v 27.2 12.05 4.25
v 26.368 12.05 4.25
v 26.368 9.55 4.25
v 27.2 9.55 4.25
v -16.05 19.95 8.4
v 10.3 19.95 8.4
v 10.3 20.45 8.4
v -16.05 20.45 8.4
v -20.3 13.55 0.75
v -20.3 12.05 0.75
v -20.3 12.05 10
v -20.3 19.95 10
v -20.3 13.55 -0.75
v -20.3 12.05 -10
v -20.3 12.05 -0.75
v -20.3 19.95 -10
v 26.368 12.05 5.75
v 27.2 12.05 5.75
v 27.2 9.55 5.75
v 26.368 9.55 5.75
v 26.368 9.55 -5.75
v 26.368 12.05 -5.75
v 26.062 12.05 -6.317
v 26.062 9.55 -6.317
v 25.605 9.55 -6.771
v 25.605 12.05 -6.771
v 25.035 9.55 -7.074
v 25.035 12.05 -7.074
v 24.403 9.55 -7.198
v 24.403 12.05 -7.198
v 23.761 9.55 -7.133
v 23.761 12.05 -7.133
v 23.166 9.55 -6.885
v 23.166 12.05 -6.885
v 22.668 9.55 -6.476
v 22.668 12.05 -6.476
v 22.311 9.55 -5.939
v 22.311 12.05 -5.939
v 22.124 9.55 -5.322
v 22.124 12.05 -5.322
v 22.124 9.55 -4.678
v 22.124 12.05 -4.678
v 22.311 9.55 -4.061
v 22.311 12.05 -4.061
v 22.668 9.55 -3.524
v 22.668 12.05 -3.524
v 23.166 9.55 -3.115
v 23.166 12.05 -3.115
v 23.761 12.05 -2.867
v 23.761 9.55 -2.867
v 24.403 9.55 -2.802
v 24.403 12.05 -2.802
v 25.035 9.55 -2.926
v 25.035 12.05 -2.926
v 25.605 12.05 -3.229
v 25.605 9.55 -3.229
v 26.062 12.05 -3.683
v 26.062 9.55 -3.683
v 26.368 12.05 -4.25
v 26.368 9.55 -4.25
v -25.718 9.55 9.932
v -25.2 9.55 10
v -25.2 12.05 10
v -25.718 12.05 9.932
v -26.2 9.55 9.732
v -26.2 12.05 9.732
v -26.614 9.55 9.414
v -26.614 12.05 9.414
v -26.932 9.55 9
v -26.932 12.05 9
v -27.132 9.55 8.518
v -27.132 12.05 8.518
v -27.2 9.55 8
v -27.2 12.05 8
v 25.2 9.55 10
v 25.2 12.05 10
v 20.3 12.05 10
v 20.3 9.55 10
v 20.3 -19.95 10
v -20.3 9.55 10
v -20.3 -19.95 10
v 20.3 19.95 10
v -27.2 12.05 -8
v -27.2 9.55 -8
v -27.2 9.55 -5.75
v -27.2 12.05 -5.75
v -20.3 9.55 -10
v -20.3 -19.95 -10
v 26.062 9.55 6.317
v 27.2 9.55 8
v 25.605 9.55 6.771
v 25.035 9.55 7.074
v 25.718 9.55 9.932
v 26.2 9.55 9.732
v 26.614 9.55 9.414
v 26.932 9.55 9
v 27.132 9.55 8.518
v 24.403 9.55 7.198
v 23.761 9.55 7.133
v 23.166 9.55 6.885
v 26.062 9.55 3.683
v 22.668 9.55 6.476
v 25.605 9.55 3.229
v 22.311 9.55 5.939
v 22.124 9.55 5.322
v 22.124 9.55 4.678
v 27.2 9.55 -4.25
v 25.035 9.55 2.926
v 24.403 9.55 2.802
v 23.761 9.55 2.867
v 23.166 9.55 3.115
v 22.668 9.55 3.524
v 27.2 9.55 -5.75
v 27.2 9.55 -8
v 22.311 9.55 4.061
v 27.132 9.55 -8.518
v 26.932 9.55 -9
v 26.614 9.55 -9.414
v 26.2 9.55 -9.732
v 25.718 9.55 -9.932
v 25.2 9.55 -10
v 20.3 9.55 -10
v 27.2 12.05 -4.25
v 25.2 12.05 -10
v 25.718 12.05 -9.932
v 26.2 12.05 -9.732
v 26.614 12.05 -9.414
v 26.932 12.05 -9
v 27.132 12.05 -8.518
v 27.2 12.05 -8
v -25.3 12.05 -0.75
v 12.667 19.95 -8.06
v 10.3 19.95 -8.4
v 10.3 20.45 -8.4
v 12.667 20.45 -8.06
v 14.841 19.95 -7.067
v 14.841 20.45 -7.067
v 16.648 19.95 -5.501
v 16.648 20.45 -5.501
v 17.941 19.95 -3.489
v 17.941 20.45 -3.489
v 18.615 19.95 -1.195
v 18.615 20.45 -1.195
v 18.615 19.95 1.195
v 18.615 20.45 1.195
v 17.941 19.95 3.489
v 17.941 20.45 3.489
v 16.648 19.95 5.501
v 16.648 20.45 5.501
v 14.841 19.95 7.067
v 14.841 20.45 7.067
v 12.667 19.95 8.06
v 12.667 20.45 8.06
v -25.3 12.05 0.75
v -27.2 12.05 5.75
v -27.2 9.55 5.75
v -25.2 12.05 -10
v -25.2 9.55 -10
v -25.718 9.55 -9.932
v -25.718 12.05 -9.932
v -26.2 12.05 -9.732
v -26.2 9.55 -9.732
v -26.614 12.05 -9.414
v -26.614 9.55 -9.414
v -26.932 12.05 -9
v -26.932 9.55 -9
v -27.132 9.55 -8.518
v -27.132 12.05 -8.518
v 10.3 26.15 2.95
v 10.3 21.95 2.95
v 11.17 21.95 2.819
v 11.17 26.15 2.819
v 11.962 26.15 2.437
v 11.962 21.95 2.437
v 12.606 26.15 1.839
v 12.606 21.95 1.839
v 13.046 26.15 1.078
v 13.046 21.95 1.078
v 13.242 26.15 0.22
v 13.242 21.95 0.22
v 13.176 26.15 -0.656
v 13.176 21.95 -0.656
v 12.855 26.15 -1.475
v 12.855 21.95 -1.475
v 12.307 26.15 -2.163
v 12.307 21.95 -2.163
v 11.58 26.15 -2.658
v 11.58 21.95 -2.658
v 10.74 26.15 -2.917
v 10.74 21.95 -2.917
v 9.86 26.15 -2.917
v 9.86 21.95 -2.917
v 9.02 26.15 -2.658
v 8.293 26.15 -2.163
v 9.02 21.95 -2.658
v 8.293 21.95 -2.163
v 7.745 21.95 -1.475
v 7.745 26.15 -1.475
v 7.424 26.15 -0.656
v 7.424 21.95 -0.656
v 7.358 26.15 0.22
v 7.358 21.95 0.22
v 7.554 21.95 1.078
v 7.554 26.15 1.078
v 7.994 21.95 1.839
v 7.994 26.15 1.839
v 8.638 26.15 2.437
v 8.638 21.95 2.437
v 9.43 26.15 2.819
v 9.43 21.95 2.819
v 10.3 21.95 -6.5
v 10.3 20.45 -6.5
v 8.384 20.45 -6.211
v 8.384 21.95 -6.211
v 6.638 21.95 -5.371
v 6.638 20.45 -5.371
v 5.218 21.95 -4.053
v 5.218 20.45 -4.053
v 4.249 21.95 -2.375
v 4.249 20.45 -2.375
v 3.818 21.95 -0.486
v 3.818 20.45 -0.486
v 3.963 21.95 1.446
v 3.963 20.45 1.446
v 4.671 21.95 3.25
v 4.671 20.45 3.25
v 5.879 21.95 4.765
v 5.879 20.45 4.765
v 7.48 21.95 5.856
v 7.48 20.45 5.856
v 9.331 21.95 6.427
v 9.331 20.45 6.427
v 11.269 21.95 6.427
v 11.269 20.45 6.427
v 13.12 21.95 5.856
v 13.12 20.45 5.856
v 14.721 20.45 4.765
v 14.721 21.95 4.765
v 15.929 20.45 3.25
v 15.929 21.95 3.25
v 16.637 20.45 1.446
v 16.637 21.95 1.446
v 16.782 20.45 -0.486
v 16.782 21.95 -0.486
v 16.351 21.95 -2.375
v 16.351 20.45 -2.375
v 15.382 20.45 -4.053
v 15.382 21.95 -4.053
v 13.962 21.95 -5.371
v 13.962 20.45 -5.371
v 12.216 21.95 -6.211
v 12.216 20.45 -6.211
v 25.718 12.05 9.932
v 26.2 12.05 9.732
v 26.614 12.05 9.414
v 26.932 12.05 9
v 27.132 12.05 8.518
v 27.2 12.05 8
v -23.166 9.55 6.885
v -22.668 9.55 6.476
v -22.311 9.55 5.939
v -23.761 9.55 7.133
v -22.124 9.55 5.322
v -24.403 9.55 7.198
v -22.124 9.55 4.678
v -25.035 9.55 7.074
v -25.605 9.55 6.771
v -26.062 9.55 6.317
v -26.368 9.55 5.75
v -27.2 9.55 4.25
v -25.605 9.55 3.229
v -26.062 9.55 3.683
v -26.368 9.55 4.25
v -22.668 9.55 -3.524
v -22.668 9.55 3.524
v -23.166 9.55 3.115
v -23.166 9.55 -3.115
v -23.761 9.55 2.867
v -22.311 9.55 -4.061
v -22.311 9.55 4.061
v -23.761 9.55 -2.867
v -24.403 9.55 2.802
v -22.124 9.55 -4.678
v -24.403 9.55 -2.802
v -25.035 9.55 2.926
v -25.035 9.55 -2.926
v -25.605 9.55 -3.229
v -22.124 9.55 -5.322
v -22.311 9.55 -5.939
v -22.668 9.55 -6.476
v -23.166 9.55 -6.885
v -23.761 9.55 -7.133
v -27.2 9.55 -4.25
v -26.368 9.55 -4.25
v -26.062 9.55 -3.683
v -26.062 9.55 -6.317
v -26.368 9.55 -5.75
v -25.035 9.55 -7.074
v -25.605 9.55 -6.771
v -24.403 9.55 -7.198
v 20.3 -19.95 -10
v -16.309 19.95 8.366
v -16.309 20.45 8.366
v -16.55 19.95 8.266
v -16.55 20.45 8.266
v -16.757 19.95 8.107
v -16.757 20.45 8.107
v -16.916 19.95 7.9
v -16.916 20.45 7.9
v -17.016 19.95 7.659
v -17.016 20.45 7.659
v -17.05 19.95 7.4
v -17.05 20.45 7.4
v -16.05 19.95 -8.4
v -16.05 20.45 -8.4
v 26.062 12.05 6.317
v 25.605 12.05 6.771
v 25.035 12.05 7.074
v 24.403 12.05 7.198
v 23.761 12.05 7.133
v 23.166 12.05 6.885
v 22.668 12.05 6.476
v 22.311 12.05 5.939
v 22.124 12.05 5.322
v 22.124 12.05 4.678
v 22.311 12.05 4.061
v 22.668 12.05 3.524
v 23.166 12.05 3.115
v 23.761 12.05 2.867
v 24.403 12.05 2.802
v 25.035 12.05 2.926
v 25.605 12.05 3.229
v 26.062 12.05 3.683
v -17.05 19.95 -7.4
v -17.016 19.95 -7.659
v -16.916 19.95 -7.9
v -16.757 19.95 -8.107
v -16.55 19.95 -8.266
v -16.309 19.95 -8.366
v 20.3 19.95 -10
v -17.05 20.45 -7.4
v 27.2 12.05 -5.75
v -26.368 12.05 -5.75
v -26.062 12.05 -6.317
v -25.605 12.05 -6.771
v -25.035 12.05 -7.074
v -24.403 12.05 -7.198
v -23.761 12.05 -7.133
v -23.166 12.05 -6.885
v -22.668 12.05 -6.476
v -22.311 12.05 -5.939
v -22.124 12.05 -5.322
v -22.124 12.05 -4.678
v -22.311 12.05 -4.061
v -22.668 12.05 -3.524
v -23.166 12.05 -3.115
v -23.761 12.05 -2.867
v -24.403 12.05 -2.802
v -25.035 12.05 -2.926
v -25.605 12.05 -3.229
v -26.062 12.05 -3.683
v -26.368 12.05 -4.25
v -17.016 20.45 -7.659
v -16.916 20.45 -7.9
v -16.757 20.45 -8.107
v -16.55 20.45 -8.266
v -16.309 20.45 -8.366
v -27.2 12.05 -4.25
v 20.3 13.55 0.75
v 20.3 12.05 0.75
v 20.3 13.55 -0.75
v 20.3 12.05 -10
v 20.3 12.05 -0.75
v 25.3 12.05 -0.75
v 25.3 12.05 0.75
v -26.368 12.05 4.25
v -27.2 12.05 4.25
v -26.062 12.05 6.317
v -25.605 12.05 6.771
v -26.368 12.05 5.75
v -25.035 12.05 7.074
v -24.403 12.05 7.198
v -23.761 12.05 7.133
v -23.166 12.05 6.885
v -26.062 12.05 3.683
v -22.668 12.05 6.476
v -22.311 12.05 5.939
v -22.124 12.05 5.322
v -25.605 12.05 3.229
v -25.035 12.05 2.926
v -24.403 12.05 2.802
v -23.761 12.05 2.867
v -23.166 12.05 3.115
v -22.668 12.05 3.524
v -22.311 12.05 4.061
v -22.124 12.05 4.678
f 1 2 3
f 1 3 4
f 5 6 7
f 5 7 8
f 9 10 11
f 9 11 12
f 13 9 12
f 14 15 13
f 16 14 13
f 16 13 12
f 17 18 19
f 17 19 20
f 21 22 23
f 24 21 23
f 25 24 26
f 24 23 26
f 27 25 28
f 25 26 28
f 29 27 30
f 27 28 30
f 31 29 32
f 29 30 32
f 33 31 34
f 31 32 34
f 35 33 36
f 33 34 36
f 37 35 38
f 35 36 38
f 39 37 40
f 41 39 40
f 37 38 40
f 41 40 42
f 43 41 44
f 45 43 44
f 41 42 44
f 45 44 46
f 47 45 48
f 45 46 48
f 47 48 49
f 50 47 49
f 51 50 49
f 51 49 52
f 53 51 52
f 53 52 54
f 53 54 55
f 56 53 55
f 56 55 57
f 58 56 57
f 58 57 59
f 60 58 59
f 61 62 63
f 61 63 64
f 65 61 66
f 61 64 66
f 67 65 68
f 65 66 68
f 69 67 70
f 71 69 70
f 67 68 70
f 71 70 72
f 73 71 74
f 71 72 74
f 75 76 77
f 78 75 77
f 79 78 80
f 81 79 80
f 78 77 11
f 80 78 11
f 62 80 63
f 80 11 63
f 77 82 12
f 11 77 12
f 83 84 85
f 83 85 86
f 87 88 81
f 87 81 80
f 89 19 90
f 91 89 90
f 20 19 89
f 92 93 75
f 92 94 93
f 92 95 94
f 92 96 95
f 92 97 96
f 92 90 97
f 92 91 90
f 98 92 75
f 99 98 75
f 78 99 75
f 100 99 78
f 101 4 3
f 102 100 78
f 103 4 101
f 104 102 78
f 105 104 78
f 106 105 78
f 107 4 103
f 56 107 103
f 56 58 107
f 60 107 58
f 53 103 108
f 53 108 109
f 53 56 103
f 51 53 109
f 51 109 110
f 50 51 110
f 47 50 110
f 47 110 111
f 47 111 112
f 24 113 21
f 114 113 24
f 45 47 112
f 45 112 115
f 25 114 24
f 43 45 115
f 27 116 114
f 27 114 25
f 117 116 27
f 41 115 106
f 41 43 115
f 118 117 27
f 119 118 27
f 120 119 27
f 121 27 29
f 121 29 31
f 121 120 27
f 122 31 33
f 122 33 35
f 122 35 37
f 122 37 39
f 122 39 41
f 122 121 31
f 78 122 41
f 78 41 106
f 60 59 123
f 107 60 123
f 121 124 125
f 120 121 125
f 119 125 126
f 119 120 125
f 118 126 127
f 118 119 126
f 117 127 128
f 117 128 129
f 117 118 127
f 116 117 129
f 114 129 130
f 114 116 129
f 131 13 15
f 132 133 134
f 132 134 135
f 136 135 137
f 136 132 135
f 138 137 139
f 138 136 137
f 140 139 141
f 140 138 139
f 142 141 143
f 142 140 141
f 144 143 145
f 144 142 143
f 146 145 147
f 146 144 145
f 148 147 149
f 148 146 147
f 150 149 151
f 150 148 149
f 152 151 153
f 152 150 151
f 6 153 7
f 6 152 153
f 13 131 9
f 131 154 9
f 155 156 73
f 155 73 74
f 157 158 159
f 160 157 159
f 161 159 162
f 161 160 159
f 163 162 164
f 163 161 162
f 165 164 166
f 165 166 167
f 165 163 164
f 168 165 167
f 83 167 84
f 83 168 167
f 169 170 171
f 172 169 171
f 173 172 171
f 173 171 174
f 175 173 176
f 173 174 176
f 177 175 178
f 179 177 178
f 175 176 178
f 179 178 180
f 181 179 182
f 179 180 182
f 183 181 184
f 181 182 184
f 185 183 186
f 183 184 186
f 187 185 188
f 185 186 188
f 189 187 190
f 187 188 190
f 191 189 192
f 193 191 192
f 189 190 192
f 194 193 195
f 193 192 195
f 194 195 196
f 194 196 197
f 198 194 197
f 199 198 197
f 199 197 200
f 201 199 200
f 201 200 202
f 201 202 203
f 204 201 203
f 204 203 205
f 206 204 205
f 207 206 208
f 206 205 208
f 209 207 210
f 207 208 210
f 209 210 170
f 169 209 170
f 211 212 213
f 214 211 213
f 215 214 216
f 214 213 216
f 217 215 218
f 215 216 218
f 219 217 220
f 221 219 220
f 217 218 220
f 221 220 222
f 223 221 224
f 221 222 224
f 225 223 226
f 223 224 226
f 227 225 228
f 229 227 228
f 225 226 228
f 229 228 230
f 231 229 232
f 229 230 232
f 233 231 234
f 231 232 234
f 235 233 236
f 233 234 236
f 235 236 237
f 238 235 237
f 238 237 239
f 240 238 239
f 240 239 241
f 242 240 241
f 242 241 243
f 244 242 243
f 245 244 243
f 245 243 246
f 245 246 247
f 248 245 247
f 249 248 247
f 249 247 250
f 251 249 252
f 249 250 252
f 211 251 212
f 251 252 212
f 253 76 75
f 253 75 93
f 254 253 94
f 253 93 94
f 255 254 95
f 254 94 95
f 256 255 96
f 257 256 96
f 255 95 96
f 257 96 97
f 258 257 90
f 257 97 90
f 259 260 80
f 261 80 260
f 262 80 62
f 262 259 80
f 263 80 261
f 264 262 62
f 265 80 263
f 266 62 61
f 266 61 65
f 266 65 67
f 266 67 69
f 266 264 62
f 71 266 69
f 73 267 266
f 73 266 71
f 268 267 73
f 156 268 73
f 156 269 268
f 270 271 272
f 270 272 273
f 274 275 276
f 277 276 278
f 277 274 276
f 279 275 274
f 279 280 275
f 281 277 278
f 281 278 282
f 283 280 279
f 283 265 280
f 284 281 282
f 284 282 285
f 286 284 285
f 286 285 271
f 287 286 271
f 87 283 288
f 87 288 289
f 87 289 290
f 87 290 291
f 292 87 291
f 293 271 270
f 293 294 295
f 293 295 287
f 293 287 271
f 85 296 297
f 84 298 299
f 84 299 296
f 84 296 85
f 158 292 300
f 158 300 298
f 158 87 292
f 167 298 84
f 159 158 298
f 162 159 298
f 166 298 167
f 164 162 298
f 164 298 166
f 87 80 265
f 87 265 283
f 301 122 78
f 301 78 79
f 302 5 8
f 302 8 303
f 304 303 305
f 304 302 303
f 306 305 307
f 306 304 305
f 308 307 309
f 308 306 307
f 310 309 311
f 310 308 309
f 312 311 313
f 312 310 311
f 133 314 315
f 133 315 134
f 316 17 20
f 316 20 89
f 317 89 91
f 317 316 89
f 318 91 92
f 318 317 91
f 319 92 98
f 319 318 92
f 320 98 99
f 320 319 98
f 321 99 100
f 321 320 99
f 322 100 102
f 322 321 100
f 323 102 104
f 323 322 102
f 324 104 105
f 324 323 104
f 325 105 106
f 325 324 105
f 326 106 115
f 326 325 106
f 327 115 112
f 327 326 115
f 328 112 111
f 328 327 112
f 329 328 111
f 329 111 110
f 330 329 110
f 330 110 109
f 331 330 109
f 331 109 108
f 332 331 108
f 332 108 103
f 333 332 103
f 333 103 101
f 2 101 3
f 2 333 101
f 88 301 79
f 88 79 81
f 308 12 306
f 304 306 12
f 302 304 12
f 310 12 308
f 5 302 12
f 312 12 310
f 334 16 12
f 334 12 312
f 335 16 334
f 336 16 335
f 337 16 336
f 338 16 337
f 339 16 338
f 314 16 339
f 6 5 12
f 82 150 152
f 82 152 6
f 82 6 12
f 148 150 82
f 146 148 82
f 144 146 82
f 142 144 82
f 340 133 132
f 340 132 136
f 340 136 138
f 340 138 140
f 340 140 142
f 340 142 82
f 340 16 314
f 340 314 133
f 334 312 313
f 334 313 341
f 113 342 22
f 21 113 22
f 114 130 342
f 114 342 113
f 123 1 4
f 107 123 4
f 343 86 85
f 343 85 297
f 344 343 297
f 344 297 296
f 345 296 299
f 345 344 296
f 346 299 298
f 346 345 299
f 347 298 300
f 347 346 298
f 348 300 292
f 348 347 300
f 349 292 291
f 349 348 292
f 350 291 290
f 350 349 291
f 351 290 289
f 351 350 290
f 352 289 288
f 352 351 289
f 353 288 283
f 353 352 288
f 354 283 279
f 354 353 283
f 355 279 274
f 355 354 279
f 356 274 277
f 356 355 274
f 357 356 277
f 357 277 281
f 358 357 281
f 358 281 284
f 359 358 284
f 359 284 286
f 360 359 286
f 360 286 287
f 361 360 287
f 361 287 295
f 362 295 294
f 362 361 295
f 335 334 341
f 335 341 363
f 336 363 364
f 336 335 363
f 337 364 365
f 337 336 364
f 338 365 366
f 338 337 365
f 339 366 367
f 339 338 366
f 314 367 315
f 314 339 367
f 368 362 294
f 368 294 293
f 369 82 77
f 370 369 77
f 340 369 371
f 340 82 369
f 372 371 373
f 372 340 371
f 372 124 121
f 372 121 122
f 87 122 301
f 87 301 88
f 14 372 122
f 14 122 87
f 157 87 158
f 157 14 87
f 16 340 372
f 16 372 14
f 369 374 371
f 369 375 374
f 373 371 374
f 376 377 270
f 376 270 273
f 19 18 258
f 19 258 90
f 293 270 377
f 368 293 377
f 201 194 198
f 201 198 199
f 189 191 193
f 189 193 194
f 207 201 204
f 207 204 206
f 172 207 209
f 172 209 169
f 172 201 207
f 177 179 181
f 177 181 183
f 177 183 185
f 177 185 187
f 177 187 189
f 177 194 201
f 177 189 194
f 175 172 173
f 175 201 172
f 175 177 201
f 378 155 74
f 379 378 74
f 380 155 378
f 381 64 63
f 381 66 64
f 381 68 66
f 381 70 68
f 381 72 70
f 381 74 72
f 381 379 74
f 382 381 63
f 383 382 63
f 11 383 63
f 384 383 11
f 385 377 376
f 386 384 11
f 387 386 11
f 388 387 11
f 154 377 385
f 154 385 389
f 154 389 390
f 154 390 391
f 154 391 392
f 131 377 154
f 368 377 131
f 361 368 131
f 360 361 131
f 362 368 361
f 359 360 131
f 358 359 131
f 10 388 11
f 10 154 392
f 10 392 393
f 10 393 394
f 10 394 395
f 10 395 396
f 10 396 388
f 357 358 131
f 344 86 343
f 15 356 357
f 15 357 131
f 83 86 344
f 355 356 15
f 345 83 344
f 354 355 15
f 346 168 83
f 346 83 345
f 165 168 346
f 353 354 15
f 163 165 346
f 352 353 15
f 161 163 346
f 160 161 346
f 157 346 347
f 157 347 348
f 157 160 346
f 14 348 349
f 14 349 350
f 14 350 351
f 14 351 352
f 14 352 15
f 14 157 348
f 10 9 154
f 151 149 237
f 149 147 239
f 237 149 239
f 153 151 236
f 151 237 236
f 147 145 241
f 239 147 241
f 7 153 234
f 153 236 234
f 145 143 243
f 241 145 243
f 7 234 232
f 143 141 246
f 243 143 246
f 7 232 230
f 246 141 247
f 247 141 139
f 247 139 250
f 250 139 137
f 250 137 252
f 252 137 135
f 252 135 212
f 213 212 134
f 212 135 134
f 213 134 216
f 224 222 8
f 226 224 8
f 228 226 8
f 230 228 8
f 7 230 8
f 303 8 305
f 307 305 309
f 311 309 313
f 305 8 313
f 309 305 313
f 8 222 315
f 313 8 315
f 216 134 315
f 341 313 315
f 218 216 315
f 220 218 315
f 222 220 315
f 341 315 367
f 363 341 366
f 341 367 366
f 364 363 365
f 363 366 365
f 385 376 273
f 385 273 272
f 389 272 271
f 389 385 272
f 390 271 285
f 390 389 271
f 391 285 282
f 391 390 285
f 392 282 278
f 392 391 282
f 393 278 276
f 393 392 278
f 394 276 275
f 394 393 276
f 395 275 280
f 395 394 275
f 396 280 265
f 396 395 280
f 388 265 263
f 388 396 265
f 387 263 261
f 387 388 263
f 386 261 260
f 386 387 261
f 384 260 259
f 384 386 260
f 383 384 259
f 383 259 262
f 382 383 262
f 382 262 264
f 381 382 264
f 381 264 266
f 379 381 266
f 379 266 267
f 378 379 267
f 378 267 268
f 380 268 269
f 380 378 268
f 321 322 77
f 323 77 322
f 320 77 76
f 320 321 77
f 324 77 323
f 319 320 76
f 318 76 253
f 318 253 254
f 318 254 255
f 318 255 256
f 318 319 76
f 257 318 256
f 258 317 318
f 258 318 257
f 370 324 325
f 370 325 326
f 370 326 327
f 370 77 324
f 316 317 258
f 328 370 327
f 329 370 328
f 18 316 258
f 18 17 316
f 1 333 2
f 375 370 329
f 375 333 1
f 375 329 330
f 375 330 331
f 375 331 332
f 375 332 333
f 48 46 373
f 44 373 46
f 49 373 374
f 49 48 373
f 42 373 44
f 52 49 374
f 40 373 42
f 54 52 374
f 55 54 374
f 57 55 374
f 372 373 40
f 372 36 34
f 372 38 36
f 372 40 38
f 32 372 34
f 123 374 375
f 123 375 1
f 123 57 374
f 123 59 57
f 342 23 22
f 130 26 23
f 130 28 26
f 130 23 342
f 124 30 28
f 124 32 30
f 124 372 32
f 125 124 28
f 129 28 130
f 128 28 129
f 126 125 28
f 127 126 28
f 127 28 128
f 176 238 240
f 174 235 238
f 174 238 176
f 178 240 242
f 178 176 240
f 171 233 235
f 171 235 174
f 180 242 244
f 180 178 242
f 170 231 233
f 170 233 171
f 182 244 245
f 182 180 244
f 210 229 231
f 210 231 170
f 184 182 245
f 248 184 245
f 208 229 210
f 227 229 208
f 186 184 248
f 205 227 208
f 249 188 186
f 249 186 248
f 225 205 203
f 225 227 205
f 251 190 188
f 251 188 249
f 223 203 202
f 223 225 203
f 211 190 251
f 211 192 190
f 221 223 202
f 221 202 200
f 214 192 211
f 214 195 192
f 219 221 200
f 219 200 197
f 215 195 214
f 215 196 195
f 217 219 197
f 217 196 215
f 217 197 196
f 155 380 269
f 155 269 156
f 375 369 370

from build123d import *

# Parameters (mm, degrees)
EXTRUDE_1_DEPTH      = 10
EXTRUDE_1_DEPTH_BACK = 10
CUT_EXTRUDE_1_DEPTH  = 5
EXTRUDE_2_DEPTH      = 0.5
SKETCH_4_R           = 6.5
EXTRUDE_3_DEPTH      = 1.5
SKETCH_5_R           = 2.95
EXTRUDE_4_DEPTH      = 4.2
FILLET_1_R           = 2
EXTRUDE_5_DEPTH      = 0.75


with BuildPart() as part:
    # 草图1 → 凸台-拉伸1 (new, two sides: drawn at the far end of the back side and taken through both)
    with BuildSketch(Plane.XY.offset(-EXTRUDE_1_DEPTH_BACK)):
        Polygon((-20.3, 19.95), (20.3, 19.95), (20.3, 12.05), (27.2, 12.05), (27.2, 9.55), (20.3, 9.55), (20.3, -19.95), (-20.3, -19.95), (-20.3, 9.55), (-27.2, 9.55), (-27.2, 12.05), (-20.3, 12.05), align=None)
    extrude(amount=EXTRUDE_1_DEPTH + EXTRUDE_1_DEPTH_BACK)

    # 草图2 → 切除-拉伸1 (cut)
    with BuildSketch(Plane(origin=(0, 12.05, 0), x_dir=(1, 0, 0), z_dir=(0, 1, 0))):
        with BuildLine():
            Line((26.368211788, 4.25), (29.350265645, 4.25))
            Line((29.350265645, 4.25), (29.350265645, 5.75))
            Line((29.350265645, 5.75), (26.368211788, 5.75))
            ThreePointArc((26.368211788, 5.75), (22.1, 5), (26.368211788, 4.25))
        make_face()
        with BuildLine():
            Line((26.368211788, -4.25), (29.350265645, -4.25))
            Line((29.350265645, -4.25), (29.350265645, -5.75))
            Line((29.350265645, -5.75), (26.368211788, -5.75))
            ThreePointArc((26.368211788, -5.75), (22.1, -5), (26.368211788, -4.25))
        make_face()
        with BuildLine():
            Line((-26.368211788, -5.75), (-29.350265645, -5.75))
            Line((-29.350265645, -5.75), (-29.350265645, -4.25))
            Line((-29.350265645, -4.25), (-26.368211788, -4.25))
            ThreePointArc((-26.368211788, -4.25), (-22.1, -5), (-26.368211788, -5.75))
        make_face()
        with BuildLine():
            Line((-26.368211788, 4.25), (-29.350265645, 4.25))
            Line((-29.350265645, 4.25), (-29.350265645, 5.75))
            Line((-29.350265645, 5.75), (-26.368211788, 5.75))
            ThreePointArc((-26.368211788, 5.75), (-22.1, 5), (-26.368211788, 4.25))
        make_face()
    extrude(amount=-CUT_EXTRUDE_1_DEPTH, mode=Mode.SUBTRACT)

    # 草图3 → 凸台-拉伸2 (add)
    with BuildSketch(Plane(origin=(0, 19.95, 0), x_dir=(1, 0, 0), z_dir=(0, 1, 0))):
        with BuildLine():
            Line((-16.05, 8.4), (10.3, 8.4))
            ThreePointArc((10.3, 8.4), (18.7, 0), (10.3, -8.4))
            Line((10.3, -8.4), (-16.05, -8.4))
            ThreePointArc((-16.05, -8.4), (-16.757106781, -8.107106781), (-17.05, -7.4))
            Line((-17.05, -7.4), (-17.05, 7.4))
            ThreePointArc((-17.05, 7.4), (-16.757106781, 8.107106781), (-16.05, 8.4))
        make_face()
    extrude(amount=EXTRUDE_2_DEPTH)

    # 草图4 → 凸台-拉伸3 (add)
    with BuildSketch(Plane(origin=(0, 20.45, 0), x_dir=(1, 0, 0), z_dir=(0, 1, 0))):
        with Locations((10.3, 0)):
            Circle(SKETCH_4_R)
    extrude(amount=EXTRUDE_3_DEPTH)

    # 草图5 → 凸台-拉伸4 (add)
    with BuildSketch(Plane(origin=(0, 21.95, 0), x_dir=(1, 0, 0), z_dir=(0, 1, 0))):
        with Locations((10.3, 0)):
            Circle(SKETCH_5_R)
    extrude(amount=EXTRUDE_4_DEPTH)

    # 圆角1
    fillet_1_edges = [part.edges().sort_by_distance(p)[0] for p in [
        (-27.2, 10.8, 10),
        (-27.2, 10.8, -10),
        (27.2, 10.8, -10),
        (27.2, 10.8, 10),
    ]]
    fillet(fillet_1_edges, radius=FILLET_1_R)

    # 草图8 → 凸台-拉伸5 (add, symmetric)
    with BuildSketch(Plane.XY):
        Polygon((20.3, 13.55), (20.3, 12.05), (25.3, 12.05), align=None)
    extrude_5 = extrude(amount=EXTRUDE_5_DEPTH, both=True)

    # 镜向1: 凸台-拉伸5 across plane
    add(extrude_5.mirror(Plane(origin=(0, 0, 0), x_dir=(0, 0, 1), z_dir=(1, 0, 0))))


solid = part.part
